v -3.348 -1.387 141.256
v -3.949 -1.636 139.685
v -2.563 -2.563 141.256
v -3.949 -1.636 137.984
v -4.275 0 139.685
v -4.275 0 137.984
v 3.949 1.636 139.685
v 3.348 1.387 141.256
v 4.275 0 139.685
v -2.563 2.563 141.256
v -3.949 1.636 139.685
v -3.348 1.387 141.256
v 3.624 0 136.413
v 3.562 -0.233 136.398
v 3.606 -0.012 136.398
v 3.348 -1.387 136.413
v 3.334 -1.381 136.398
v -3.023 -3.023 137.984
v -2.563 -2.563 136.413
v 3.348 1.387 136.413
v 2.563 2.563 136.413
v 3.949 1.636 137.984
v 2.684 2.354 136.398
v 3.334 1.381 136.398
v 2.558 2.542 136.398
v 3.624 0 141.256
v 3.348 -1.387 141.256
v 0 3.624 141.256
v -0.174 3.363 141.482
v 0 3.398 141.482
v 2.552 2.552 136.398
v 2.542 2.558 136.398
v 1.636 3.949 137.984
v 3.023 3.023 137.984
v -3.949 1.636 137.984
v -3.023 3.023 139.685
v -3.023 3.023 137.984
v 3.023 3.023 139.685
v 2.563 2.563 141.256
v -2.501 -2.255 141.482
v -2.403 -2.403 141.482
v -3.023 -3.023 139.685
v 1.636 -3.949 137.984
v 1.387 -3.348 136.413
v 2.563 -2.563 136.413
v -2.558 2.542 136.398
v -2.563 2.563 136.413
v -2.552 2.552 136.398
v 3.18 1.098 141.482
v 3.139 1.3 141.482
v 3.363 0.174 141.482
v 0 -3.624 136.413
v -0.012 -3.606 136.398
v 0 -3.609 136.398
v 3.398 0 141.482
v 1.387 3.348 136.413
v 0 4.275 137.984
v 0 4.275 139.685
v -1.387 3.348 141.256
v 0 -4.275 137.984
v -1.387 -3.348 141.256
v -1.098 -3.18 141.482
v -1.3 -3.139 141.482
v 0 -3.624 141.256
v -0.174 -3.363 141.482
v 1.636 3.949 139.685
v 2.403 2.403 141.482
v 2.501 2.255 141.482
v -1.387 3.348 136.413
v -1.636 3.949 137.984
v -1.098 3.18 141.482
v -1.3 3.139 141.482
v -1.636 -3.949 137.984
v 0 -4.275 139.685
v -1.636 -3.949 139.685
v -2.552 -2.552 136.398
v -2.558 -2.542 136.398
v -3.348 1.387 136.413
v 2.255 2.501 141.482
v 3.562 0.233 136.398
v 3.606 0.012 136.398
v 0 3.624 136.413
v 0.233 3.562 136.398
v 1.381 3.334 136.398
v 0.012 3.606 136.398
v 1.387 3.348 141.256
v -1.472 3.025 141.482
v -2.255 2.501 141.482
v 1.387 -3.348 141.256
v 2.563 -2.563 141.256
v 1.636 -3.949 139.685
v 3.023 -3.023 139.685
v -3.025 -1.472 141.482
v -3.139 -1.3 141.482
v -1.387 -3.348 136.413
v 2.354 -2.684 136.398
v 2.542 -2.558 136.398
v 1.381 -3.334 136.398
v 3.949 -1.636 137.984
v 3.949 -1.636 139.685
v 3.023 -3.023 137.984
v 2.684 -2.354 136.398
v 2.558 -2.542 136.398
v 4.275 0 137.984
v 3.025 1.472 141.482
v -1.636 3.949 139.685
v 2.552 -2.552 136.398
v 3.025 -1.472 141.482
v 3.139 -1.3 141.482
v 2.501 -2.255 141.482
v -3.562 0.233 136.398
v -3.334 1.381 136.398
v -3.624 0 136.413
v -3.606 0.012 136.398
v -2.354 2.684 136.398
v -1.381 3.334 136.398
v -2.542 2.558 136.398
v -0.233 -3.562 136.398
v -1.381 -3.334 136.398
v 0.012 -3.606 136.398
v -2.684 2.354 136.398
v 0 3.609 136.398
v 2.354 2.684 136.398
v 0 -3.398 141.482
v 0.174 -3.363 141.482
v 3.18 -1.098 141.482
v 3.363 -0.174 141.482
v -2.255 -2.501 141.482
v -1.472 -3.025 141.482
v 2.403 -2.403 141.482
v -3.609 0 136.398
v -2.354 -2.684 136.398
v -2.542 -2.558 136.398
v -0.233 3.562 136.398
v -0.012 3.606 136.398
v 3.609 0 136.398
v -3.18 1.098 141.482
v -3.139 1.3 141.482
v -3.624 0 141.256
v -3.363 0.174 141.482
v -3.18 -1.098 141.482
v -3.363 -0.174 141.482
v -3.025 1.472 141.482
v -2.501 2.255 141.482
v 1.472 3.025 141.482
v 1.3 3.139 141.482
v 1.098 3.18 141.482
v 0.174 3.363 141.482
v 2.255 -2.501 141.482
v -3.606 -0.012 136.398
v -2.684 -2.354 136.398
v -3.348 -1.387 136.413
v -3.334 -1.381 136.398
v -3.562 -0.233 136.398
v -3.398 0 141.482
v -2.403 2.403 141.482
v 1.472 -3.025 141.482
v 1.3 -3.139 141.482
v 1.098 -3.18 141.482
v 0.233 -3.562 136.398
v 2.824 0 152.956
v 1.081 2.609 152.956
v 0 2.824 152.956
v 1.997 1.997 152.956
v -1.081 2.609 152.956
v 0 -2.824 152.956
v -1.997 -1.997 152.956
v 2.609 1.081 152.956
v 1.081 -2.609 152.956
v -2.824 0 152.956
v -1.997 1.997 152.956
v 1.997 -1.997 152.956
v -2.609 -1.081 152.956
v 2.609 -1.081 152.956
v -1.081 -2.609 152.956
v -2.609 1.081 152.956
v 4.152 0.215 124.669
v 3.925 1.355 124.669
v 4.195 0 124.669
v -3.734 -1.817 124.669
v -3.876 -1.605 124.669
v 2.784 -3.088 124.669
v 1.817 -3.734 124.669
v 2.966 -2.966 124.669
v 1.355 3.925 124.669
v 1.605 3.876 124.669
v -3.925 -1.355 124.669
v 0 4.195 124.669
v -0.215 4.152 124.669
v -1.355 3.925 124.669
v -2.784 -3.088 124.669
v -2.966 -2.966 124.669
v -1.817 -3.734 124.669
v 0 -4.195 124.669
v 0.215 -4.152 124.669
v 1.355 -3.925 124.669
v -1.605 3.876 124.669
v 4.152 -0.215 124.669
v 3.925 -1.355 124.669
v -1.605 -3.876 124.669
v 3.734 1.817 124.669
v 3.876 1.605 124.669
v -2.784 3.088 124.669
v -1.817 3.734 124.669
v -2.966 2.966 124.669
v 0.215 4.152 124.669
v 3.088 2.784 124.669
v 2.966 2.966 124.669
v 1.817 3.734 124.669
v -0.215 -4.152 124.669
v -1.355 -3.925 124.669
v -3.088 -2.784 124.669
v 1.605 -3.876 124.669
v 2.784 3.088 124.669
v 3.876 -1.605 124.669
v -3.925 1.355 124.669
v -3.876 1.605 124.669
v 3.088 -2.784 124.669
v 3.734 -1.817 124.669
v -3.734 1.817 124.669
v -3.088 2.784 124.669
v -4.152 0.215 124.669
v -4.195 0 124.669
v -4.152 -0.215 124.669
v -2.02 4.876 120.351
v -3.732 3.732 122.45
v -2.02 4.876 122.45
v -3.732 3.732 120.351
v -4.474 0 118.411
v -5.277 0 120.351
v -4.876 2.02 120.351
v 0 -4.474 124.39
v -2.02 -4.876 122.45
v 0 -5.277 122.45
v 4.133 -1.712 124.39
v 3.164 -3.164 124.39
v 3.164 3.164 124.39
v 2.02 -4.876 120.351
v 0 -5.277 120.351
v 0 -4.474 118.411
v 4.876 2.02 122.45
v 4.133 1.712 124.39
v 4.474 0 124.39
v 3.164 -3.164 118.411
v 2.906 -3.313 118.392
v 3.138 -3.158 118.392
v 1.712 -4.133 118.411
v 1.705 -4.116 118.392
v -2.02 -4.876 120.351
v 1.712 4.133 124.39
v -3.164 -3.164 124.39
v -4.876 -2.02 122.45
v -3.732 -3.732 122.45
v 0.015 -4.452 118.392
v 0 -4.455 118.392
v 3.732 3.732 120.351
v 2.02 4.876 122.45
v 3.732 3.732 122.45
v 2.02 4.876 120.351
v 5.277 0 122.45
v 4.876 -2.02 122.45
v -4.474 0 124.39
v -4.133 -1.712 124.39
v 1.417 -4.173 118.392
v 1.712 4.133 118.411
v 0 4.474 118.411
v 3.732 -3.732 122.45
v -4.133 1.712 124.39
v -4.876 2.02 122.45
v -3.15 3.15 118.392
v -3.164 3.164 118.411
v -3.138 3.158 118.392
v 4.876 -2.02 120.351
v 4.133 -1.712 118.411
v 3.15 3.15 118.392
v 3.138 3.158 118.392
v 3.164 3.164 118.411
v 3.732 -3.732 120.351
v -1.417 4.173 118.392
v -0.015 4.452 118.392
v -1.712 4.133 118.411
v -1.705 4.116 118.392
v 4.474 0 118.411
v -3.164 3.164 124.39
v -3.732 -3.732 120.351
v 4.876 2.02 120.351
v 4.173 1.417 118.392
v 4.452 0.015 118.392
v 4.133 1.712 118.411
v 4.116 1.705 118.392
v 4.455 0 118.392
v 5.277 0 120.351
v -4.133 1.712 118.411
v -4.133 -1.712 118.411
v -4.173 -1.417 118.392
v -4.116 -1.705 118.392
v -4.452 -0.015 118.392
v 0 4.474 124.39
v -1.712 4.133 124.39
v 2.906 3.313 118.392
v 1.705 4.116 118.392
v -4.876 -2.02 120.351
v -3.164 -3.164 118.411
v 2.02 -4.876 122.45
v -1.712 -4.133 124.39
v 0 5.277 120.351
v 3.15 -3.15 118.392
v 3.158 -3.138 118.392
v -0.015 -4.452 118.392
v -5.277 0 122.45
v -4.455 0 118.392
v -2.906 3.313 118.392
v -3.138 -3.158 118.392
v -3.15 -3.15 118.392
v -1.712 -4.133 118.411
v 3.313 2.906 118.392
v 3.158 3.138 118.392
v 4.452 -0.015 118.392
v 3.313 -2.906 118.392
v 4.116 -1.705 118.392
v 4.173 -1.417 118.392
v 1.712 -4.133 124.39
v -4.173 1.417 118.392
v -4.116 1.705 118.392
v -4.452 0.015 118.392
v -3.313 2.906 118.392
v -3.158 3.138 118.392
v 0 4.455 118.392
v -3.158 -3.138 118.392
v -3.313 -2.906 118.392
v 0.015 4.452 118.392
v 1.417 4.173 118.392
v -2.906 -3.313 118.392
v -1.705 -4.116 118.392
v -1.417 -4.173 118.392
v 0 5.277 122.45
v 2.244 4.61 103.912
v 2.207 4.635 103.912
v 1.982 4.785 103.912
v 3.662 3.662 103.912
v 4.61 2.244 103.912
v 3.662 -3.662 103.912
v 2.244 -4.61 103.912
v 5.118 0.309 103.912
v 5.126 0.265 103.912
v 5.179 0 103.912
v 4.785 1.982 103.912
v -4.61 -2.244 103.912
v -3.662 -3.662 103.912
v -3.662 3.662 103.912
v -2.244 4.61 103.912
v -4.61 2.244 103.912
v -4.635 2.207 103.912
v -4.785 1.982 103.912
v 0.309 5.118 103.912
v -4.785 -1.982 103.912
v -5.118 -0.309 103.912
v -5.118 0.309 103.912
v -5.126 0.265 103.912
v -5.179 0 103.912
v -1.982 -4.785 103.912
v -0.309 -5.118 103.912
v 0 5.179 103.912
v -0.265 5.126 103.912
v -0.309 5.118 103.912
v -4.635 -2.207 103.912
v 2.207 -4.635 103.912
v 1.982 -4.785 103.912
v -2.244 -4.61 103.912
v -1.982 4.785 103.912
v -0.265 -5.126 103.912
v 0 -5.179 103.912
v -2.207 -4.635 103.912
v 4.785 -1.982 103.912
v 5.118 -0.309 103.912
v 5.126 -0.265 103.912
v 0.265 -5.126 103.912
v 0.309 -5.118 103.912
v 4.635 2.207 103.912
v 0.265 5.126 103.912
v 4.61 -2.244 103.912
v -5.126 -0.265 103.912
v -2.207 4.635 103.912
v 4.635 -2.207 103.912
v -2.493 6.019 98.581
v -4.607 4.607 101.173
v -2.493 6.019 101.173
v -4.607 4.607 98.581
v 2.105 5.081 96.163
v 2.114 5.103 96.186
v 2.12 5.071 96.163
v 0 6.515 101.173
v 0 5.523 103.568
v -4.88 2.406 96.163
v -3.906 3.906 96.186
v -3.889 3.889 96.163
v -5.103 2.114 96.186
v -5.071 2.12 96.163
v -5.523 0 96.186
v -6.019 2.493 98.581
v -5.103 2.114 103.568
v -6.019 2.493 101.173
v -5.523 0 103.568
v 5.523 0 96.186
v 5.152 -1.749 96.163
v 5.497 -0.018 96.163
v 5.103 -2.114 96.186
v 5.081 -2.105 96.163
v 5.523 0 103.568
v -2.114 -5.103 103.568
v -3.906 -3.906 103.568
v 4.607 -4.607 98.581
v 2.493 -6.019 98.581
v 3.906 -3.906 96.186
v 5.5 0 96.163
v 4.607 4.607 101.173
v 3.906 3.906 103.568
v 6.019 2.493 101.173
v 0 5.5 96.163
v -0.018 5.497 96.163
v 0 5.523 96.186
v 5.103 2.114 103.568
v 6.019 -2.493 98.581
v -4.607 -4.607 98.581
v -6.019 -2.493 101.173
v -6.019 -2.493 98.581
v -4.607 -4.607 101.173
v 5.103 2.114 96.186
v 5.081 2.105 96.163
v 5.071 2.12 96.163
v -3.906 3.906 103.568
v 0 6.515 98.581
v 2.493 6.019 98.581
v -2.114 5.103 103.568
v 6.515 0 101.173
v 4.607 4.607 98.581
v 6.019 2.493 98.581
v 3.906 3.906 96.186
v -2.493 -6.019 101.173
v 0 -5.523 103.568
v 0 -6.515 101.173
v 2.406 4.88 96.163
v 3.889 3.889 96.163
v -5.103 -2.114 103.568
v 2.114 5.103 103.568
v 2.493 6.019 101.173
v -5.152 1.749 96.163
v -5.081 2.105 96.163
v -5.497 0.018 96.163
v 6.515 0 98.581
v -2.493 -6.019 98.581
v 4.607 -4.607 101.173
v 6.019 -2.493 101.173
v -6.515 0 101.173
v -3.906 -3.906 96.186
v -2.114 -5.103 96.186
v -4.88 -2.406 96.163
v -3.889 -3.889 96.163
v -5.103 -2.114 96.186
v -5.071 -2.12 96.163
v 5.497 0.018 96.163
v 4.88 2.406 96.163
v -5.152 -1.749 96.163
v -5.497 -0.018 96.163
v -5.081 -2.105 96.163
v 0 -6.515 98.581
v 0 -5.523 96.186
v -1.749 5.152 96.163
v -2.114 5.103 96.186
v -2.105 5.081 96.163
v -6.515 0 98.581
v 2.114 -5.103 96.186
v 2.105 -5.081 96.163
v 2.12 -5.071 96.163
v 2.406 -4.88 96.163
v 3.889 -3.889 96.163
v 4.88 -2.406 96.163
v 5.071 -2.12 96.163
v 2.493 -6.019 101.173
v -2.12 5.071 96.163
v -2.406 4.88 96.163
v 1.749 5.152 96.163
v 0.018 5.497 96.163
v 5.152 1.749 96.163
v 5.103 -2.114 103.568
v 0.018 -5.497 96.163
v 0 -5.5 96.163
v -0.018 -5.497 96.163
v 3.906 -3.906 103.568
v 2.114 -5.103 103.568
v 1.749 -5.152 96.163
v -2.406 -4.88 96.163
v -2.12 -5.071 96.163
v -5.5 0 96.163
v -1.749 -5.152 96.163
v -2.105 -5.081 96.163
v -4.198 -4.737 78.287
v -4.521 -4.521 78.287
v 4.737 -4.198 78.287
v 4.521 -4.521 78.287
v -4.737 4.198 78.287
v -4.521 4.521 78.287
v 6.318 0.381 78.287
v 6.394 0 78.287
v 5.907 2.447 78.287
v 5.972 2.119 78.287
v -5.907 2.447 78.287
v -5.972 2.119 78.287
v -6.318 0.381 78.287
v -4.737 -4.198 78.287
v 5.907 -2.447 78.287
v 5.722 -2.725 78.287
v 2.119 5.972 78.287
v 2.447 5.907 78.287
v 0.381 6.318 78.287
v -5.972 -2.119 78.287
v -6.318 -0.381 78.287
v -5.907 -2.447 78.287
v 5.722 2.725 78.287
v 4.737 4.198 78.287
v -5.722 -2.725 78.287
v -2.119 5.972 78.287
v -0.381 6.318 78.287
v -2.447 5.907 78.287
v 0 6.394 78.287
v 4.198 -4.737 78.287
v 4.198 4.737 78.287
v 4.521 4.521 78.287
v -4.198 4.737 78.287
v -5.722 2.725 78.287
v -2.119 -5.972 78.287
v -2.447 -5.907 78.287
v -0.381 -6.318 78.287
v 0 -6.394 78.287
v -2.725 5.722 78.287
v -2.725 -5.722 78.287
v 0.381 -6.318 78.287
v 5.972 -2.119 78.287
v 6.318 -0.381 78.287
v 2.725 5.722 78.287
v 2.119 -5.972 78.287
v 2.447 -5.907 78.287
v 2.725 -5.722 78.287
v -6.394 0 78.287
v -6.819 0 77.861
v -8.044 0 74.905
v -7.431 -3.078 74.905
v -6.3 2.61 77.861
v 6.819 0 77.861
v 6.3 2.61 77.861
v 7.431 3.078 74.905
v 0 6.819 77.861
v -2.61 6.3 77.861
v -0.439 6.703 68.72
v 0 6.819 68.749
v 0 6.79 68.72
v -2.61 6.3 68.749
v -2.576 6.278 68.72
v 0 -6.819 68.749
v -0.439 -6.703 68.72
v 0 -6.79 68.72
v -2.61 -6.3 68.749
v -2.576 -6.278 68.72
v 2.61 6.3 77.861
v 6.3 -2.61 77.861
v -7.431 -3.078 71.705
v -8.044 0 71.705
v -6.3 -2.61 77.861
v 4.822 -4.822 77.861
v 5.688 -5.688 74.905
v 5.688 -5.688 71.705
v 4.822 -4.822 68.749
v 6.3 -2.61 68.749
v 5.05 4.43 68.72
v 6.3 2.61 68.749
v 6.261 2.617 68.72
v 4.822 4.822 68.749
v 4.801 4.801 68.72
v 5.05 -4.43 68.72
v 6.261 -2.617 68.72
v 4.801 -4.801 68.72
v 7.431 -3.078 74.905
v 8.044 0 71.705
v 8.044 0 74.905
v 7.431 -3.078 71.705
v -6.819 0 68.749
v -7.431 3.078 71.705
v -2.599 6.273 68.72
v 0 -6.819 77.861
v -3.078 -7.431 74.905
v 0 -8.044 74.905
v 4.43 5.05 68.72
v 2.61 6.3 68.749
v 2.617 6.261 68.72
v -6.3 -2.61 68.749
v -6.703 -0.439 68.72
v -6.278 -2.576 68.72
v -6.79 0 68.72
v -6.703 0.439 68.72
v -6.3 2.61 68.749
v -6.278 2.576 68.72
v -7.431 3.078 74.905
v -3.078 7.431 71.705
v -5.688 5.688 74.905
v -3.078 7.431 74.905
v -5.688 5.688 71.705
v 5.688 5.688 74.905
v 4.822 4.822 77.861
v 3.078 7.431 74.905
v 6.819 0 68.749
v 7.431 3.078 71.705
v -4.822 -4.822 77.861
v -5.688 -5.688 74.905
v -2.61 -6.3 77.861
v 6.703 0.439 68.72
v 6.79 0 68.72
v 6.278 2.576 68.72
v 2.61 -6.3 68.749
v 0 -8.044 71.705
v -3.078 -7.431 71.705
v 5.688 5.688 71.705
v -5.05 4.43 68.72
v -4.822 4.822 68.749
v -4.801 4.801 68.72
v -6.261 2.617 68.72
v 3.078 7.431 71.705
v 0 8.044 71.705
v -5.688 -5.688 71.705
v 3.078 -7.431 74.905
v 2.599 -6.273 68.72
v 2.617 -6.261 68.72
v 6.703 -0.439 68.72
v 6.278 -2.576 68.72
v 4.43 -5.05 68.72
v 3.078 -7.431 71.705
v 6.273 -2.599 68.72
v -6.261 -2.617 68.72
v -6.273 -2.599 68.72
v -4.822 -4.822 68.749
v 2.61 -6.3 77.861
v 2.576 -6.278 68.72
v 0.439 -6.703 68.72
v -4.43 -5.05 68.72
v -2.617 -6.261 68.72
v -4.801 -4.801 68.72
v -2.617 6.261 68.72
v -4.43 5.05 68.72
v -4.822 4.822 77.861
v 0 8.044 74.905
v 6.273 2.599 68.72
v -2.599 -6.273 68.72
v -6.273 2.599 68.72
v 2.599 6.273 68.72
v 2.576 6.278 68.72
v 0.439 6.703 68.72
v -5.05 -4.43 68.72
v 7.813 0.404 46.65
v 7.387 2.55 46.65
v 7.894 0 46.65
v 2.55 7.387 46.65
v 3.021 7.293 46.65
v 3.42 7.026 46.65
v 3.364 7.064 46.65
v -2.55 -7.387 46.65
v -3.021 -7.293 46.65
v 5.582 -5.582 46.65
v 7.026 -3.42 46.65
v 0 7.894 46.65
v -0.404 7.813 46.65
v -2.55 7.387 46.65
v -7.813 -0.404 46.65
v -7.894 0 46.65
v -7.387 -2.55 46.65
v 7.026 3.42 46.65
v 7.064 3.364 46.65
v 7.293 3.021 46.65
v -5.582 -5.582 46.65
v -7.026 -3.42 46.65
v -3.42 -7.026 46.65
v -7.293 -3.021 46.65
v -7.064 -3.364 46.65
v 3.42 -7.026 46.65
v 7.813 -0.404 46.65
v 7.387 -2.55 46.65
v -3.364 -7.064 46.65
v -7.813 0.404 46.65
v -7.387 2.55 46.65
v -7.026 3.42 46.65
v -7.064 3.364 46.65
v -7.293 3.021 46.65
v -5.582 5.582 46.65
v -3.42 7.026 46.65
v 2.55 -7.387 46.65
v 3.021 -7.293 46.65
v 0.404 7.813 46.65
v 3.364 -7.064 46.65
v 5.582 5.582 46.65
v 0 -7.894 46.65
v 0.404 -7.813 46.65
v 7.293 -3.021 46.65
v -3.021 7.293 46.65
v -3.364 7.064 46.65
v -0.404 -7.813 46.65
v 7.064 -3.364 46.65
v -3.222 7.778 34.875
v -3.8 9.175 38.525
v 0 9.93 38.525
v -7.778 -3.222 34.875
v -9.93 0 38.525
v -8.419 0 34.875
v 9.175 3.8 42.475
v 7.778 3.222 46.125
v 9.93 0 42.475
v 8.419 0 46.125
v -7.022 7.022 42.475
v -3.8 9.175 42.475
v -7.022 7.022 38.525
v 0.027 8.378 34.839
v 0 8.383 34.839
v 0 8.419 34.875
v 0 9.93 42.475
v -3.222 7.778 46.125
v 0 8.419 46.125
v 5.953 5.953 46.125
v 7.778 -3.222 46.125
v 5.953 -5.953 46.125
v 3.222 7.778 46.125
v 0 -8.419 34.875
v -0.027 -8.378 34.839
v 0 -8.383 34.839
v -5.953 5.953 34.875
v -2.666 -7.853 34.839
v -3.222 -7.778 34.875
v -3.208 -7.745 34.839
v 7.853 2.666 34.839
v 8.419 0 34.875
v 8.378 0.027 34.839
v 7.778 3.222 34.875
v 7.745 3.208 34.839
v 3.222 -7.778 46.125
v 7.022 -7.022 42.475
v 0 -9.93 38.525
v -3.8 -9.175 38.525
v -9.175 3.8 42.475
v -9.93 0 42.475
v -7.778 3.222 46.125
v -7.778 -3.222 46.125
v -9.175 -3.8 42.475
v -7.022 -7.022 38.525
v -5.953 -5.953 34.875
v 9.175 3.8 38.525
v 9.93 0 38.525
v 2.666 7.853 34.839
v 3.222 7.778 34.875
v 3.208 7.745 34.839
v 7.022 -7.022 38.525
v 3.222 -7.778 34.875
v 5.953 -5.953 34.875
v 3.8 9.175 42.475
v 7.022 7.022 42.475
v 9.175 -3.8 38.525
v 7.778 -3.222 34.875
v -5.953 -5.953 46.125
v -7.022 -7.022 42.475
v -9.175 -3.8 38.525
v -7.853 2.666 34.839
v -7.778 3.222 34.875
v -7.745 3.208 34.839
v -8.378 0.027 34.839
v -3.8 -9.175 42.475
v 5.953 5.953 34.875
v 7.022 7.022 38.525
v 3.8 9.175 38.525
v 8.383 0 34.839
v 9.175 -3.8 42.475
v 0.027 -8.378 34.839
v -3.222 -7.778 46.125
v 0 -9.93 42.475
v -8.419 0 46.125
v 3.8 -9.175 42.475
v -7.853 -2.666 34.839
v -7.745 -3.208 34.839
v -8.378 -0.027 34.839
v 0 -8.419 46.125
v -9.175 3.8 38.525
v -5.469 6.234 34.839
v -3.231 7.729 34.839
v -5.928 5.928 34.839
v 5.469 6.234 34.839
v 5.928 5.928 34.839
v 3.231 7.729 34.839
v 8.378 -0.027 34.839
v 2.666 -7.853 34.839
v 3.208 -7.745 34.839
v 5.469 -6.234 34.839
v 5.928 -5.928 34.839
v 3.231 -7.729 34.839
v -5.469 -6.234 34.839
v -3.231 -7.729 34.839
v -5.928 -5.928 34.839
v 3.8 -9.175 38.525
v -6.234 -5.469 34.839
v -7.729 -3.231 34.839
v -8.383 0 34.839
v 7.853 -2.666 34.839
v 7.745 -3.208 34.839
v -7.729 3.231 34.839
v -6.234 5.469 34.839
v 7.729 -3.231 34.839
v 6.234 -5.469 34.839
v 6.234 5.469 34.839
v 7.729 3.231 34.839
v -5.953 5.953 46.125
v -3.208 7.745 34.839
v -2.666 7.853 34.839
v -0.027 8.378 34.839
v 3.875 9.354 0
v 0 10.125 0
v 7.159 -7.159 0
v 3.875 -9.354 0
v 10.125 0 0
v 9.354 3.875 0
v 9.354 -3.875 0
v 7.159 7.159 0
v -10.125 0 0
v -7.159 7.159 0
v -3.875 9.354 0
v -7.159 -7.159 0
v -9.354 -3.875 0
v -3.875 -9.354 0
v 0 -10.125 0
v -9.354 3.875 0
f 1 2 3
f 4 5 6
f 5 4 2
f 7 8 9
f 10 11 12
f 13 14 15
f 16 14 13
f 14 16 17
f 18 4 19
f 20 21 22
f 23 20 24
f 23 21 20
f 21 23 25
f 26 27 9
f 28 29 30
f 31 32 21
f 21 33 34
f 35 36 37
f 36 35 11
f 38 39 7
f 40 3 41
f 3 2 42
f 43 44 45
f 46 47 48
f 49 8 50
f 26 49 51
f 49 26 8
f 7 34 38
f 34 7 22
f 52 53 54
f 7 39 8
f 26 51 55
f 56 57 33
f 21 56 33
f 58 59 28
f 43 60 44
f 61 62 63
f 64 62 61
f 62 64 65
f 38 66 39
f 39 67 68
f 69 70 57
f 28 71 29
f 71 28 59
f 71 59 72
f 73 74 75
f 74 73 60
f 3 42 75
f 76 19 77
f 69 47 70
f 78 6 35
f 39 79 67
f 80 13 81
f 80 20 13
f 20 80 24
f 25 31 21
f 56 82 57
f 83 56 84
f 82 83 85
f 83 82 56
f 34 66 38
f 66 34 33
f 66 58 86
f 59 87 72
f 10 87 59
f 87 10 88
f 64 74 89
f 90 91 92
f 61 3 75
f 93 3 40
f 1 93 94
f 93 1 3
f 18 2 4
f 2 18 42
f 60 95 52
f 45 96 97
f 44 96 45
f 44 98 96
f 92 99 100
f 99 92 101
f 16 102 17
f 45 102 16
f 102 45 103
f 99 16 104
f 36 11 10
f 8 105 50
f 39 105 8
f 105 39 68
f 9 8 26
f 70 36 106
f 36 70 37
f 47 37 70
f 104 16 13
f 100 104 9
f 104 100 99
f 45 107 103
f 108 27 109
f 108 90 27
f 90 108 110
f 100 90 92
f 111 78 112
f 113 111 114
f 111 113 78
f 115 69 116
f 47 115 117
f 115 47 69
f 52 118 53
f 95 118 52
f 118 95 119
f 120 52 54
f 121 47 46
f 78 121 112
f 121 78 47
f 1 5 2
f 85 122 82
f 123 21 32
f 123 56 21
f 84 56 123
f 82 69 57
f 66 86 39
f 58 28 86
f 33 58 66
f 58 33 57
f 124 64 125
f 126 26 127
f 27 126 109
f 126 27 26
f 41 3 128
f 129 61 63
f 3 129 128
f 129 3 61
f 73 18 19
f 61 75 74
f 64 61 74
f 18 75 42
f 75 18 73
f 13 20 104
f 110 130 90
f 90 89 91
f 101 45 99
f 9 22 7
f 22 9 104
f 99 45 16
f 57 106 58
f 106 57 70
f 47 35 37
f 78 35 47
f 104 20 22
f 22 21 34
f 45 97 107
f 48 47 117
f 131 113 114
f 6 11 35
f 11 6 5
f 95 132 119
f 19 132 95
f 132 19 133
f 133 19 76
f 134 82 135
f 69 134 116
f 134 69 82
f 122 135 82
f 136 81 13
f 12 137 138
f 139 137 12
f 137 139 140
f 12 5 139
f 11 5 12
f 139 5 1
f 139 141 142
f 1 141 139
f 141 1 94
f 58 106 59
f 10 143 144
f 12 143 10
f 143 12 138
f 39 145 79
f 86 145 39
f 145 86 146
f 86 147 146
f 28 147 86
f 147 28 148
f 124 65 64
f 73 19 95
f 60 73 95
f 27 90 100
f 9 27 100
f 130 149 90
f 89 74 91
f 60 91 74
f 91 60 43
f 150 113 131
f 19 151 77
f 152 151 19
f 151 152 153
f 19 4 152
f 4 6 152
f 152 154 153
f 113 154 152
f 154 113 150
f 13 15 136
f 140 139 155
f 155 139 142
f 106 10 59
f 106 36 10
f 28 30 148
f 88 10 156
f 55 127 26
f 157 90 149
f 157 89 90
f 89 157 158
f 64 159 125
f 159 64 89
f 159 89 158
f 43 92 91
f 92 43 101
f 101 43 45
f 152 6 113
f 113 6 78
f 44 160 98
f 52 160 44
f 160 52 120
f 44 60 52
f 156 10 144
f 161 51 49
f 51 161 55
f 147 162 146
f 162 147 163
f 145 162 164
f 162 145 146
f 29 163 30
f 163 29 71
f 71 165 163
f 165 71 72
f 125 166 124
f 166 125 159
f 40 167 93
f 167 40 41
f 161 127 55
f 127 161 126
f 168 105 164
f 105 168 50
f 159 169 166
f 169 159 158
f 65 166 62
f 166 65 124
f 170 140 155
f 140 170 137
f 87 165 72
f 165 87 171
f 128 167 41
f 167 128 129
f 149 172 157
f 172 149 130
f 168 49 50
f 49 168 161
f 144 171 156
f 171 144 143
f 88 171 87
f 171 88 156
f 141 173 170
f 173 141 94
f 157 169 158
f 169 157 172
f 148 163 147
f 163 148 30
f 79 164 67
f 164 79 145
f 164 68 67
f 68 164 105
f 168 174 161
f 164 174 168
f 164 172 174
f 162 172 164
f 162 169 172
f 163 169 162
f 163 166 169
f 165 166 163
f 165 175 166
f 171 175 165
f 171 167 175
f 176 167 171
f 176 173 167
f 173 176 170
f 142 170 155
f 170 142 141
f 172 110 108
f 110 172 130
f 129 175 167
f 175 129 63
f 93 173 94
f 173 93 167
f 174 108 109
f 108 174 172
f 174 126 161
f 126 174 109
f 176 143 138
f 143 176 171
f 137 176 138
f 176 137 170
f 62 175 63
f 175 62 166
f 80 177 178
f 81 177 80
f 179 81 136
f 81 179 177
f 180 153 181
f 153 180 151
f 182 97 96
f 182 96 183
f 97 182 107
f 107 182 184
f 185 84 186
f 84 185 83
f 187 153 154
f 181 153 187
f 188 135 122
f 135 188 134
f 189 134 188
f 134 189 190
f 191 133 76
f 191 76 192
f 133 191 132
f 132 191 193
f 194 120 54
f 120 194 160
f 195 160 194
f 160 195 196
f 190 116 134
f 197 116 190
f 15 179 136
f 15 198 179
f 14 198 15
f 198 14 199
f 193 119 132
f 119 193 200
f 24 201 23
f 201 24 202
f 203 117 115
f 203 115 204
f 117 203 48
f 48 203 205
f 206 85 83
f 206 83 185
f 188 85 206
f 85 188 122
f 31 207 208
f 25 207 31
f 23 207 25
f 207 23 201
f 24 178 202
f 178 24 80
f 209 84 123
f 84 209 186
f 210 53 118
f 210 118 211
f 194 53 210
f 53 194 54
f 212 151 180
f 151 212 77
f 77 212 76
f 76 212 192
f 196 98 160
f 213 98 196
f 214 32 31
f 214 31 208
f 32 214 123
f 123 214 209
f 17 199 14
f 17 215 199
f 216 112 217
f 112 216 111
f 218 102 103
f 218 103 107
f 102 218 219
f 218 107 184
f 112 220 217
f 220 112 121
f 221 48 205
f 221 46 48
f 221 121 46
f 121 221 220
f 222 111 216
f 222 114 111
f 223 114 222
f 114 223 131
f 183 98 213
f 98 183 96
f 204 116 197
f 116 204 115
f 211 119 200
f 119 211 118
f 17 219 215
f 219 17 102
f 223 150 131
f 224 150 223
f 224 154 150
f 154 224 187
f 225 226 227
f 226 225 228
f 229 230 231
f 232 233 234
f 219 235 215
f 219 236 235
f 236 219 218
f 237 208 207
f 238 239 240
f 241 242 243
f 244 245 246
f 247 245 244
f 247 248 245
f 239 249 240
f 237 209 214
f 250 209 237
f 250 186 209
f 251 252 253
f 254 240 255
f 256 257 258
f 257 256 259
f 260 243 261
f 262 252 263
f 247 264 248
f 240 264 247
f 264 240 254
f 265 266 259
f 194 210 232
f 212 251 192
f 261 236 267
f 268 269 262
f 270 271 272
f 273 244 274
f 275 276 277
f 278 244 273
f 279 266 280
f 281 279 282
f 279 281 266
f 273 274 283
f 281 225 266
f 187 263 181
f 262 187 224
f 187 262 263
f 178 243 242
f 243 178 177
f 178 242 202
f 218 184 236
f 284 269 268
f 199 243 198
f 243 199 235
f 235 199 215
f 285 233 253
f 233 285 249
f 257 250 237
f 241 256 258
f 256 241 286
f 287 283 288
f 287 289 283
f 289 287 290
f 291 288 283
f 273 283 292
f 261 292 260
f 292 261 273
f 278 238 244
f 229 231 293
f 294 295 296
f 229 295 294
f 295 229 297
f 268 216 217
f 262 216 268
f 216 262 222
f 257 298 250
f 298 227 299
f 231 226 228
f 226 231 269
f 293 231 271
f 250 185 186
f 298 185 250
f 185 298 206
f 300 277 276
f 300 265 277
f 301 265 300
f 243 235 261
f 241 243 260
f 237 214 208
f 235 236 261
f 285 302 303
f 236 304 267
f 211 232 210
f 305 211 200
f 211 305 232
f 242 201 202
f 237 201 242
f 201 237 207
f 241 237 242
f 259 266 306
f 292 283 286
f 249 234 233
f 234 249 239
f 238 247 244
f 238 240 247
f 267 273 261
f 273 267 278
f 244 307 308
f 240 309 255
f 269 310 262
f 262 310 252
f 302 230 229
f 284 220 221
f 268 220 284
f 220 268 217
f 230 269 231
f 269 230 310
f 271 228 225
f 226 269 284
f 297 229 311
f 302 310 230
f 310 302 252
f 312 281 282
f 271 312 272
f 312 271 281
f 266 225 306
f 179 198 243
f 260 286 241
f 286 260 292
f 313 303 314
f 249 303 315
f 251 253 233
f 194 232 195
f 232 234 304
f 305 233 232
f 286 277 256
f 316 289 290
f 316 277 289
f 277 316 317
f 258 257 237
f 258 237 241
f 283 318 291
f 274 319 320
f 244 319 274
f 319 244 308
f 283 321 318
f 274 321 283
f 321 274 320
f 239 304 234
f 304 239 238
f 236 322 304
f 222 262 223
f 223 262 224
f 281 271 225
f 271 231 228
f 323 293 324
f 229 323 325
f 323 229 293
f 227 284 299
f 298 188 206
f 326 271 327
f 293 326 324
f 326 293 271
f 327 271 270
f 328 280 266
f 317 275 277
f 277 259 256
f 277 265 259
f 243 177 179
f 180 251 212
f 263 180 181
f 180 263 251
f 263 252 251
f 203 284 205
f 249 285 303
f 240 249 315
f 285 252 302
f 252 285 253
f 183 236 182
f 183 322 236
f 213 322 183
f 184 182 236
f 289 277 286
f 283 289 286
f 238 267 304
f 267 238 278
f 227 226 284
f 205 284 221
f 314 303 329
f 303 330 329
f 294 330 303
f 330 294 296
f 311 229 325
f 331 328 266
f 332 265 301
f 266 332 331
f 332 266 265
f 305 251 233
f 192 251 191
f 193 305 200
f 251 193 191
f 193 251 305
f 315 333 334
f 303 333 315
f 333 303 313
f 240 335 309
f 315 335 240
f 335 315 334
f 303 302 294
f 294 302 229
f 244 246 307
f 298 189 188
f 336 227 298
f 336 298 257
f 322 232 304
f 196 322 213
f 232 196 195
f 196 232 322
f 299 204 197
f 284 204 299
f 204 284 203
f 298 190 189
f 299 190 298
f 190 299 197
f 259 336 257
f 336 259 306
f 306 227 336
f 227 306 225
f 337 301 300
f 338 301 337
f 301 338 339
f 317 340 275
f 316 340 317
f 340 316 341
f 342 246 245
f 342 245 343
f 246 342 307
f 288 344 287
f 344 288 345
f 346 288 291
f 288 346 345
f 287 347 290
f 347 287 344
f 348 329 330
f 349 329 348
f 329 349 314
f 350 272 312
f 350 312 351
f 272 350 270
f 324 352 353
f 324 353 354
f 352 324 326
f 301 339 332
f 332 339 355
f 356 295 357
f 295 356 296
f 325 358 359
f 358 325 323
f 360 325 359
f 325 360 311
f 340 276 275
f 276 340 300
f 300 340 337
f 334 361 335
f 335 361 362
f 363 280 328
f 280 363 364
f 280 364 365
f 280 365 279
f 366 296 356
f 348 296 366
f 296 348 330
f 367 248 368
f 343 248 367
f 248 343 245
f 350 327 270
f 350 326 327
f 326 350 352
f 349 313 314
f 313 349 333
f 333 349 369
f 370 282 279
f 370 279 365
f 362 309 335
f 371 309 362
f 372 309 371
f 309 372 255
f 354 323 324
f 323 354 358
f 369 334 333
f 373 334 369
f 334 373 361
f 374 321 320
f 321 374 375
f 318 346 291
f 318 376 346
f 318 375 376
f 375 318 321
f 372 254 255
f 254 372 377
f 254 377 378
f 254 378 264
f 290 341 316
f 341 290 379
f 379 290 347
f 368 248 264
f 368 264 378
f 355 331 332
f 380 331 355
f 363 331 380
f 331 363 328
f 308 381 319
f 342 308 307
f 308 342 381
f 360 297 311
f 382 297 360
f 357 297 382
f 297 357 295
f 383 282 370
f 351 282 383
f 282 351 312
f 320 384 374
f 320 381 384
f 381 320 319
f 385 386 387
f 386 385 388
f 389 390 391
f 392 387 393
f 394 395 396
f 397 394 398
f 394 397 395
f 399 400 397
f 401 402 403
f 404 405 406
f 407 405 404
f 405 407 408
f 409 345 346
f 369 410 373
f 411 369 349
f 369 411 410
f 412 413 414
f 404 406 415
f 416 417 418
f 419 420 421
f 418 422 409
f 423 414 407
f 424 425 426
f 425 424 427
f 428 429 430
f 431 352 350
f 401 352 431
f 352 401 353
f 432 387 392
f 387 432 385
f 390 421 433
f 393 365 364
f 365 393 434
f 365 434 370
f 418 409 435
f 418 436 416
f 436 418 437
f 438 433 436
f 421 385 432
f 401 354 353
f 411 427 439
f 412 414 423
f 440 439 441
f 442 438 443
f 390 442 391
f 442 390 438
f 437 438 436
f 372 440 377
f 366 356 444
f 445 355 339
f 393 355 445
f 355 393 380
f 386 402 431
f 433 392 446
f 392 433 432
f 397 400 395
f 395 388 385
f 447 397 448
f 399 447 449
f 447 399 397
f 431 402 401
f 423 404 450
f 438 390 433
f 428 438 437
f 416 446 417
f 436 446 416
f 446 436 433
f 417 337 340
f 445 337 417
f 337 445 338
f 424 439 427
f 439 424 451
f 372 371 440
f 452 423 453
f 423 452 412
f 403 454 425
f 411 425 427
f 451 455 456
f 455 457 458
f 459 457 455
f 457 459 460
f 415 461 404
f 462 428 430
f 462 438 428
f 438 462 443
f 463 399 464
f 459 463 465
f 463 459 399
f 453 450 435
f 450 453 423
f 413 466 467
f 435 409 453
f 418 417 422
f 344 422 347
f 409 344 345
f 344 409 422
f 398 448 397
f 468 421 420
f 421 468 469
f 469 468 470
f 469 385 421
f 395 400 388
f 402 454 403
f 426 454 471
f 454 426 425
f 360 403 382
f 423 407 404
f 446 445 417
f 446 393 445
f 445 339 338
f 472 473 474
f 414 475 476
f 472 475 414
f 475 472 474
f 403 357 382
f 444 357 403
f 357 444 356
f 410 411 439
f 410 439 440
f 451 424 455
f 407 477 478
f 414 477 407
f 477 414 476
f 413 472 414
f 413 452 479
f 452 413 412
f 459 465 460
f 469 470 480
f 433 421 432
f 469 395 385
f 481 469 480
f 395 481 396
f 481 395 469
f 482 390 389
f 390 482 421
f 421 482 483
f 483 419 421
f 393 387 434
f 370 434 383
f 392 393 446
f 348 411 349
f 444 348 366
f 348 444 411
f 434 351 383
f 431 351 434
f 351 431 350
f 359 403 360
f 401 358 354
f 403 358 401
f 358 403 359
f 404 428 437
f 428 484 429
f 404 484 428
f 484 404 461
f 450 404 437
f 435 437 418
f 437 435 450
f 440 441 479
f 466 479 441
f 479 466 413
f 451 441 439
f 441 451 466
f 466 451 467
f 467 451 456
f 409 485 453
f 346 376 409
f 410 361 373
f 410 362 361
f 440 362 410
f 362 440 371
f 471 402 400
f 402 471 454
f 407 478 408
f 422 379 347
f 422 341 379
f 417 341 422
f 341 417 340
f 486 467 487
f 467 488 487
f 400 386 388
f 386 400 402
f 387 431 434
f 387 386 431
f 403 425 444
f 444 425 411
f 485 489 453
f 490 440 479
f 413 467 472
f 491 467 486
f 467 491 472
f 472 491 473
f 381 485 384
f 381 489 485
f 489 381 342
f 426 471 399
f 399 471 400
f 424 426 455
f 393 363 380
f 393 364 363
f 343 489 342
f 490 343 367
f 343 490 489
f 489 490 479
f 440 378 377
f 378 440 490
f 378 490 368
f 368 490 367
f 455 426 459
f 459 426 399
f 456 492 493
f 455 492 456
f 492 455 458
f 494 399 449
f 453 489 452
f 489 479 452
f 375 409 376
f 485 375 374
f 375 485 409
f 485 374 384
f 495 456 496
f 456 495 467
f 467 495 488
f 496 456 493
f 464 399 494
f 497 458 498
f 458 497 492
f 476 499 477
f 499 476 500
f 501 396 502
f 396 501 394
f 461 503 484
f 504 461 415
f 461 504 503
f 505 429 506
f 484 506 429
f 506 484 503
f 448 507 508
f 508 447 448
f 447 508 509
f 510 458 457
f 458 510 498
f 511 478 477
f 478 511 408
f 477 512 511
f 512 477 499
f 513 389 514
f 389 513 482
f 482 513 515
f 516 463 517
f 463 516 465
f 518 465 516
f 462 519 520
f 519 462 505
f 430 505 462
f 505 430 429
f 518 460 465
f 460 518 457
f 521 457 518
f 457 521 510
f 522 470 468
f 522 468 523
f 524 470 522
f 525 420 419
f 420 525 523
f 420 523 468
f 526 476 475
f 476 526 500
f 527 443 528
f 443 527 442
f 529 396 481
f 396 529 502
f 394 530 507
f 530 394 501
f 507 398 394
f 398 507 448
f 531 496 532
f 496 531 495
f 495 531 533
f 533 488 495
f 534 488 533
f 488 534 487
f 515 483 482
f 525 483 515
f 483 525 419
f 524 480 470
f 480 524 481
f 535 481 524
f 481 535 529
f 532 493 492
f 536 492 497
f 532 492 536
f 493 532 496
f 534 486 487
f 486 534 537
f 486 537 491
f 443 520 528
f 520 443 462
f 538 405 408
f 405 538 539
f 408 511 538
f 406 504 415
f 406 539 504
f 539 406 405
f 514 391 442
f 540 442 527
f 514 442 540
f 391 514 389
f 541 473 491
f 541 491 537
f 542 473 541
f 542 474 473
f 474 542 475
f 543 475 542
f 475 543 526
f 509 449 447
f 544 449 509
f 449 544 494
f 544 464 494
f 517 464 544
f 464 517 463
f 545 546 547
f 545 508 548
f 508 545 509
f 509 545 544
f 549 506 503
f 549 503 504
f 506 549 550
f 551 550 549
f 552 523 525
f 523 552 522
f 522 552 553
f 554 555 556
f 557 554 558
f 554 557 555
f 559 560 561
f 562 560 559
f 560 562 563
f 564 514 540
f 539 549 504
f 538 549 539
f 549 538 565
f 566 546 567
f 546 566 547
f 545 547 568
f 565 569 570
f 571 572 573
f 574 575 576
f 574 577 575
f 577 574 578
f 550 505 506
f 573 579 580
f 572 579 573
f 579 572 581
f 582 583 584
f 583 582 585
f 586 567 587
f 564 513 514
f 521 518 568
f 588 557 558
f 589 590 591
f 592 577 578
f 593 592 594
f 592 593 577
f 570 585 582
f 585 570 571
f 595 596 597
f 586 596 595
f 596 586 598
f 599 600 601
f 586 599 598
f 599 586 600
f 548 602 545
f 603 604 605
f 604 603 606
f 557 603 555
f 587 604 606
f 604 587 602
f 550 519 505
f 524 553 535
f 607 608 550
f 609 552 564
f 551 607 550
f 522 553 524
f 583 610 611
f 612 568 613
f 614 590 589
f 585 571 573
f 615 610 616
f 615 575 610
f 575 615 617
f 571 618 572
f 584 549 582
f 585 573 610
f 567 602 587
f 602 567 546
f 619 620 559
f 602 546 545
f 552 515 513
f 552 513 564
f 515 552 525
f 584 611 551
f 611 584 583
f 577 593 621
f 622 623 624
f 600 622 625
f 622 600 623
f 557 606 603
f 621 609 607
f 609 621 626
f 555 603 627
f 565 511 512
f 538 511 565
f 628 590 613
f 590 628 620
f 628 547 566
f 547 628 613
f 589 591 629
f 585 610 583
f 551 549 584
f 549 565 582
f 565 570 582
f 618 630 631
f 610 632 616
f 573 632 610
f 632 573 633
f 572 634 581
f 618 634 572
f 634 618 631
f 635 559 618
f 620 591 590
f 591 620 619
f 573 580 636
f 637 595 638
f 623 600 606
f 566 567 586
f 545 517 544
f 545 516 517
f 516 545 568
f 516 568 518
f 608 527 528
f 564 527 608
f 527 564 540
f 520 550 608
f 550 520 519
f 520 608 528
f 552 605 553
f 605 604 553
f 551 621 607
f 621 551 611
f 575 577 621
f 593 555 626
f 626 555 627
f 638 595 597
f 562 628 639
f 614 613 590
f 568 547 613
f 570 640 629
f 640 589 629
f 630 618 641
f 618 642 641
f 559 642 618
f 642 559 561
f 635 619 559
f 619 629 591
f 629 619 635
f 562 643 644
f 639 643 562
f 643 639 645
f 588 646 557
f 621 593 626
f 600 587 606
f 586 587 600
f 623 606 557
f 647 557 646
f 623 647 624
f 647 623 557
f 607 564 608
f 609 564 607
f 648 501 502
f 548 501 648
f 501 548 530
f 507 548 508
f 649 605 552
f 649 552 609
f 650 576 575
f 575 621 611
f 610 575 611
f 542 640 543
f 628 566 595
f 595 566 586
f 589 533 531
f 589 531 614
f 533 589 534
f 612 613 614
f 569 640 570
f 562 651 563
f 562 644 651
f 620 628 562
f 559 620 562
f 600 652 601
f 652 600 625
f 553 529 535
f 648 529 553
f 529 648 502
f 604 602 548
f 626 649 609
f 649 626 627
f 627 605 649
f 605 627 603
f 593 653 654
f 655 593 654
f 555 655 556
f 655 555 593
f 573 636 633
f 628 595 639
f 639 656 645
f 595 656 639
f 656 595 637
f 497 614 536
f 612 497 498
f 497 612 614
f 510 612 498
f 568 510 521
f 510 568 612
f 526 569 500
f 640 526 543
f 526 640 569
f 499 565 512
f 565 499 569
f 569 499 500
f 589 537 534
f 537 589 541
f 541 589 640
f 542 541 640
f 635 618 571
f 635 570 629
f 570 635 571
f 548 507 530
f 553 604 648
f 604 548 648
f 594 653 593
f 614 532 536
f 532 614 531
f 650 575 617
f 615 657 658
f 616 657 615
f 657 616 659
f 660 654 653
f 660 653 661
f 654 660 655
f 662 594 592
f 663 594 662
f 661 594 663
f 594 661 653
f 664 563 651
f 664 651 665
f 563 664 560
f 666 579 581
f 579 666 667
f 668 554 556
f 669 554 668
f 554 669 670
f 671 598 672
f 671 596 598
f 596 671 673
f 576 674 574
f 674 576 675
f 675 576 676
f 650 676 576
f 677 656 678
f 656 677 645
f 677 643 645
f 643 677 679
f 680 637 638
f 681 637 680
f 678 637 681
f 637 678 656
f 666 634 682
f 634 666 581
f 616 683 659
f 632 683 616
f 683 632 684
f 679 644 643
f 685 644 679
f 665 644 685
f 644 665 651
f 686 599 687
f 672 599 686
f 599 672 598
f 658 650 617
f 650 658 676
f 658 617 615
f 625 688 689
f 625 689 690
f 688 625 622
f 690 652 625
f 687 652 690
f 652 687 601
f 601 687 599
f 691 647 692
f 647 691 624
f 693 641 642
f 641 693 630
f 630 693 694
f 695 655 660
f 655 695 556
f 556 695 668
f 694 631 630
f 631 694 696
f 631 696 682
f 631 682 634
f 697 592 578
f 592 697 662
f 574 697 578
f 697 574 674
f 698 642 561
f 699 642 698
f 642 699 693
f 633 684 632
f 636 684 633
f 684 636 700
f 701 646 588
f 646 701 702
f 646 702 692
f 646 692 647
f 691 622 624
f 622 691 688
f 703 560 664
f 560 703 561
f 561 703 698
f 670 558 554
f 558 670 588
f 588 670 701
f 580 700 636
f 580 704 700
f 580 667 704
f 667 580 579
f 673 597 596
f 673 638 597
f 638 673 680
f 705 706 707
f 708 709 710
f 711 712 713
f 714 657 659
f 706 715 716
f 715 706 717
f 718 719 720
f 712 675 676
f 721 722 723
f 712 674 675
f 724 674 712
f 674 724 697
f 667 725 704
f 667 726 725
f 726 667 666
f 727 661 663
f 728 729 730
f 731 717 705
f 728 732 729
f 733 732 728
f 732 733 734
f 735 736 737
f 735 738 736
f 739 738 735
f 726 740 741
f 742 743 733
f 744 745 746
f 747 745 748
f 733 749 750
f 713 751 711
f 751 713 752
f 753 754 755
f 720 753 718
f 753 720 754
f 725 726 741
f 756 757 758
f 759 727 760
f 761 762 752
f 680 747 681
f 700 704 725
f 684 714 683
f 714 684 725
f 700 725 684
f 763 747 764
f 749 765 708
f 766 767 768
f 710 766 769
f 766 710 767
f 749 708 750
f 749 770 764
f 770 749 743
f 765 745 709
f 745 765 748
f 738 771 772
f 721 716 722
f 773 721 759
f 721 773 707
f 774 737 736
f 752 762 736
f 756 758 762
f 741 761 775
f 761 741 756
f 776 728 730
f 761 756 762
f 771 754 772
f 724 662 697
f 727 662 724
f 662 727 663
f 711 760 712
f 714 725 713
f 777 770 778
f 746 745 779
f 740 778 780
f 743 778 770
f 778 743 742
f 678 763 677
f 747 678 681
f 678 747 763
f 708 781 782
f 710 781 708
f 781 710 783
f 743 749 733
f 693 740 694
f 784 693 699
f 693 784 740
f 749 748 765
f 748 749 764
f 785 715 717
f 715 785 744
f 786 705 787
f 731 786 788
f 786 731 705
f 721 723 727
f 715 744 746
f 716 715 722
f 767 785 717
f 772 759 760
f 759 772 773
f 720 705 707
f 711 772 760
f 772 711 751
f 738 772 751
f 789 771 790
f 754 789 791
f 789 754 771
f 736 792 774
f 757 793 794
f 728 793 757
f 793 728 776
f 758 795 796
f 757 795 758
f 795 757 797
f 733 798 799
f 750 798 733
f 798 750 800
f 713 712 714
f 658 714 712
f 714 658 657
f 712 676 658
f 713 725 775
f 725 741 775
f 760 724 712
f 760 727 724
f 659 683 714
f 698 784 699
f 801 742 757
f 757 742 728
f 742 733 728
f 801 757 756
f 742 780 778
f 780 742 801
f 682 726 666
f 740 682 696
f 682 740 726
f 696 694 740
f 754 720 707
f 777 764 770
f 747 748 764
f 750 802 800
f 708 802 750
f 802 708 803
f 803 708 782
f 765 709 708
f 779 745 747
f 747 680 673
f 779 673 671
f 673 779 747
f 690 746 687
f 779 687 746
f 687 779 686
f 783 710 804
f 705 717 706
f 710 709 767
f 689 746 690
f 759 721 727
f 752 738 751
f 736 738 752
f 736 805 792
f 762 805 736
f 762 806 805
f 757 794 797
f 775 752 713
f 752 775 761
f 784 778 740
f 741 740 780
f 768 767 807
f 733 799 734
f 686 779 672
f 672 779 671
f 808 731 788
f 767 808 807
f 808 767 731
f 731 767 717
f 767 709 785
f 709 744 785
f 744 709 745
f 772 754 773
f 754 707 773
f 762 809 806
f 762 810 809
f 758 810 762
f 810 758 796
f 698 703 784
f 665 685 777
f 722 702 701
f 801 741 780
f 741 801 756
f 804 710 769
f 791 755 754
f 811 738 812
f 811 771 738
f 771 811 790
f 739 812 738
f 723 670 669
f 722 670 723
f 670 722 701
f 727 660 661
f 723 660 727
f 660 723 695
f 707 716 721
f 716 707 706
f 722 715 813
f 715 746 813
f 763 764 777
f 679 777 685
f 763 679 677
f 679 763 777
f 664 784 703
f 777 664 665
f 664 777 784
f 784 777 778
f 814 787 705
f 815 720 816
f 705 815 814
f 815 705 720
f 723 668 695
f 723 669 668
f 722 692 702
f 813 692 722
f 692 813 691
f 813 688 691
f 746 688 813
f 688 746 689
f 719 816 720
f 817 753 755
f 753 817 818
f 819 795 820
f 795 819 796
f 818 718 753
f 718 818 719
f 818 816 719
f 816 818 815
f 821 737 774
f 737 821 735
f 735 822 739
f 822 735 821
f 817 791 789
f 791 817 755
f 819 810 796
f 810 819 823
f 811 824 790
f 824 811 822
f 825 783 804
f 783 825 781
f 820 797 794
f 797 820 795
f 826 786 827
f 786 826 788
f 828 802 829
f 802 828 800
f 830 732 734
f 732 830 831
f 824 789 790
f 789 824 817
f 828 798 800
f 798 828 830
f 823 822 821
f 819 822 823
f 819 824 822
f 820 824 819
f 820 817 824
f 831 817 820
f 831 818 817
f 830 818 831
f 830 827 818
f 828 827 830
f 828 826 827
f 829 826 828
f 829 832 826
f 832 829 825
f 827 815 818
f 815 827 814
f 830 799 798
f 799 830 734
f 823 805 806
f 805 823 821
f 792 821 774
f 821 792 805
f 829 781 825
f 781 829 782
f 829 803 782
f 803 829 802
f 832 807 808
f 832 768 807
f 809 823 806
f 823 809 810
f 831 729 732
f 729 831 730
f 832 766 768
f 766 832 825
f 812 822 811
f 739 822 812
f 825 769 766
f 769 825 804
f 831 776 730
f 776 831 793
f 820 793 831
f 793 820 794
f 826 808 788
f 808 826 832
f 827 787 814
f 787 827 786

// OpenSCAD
// Customizable Fractal Tree
// 
// By steveweber314
// 
// 5/12/2015

//
// BEGIN CUSTOMIZER

/* [Tree Parameters] */


//depth of recursion (warning: each iteration will take exponentially more time to process)
number_of_iterations = 5; // [1:10]

//starting height of the first branch
height = 45; //[1:100]


//control the amount of taper on each branch segment
width_ratio_bottom = 0.25; //[0.01:0.99]
width_ratio_top = 0.20; //[0.01:0.99]

//size of the "knuckles" between segments
knuckle_size = 0.25; //[0.01:0.99]

//smaller numbers will be more bush-like, larger numbers more tree-like
rate_of_decay = 0.75; //[0.25:1.0]

//number of faces on the cylinders
level_of_smoothness = 16; // [4:100]

//number of faces on the spheres
leaf_smoothness = 16; // [4:100]

//number of faces on the base/stand
base_smoothness = 60; //[20:200]


module trunk(size, depth)
{
 
    branch_one(size*.9, depth);          
    
}

module branch_one(size, depth)
{

	color([1,1,0]) 
	{
		//create the branch by tapering a cylinder from one radius to another
		cylinder(h = size, r1 = size*width_ratio_bottom, r2 = size*width_ratio_top);
	}

	//move to the tip of the branch
	translate([0,0,size])
	{
		//check for stop condition
		if (depth > 0) 
		{
            union() 
            {
                sphere(size*knuckle_size);

                //recursively call the trunk module again
                trunk(size*.9, depth-1);

            } 
		}
	}
}



//build the tree
trunk(height, number_of_iterations, $fn=level_of_smoothness);
